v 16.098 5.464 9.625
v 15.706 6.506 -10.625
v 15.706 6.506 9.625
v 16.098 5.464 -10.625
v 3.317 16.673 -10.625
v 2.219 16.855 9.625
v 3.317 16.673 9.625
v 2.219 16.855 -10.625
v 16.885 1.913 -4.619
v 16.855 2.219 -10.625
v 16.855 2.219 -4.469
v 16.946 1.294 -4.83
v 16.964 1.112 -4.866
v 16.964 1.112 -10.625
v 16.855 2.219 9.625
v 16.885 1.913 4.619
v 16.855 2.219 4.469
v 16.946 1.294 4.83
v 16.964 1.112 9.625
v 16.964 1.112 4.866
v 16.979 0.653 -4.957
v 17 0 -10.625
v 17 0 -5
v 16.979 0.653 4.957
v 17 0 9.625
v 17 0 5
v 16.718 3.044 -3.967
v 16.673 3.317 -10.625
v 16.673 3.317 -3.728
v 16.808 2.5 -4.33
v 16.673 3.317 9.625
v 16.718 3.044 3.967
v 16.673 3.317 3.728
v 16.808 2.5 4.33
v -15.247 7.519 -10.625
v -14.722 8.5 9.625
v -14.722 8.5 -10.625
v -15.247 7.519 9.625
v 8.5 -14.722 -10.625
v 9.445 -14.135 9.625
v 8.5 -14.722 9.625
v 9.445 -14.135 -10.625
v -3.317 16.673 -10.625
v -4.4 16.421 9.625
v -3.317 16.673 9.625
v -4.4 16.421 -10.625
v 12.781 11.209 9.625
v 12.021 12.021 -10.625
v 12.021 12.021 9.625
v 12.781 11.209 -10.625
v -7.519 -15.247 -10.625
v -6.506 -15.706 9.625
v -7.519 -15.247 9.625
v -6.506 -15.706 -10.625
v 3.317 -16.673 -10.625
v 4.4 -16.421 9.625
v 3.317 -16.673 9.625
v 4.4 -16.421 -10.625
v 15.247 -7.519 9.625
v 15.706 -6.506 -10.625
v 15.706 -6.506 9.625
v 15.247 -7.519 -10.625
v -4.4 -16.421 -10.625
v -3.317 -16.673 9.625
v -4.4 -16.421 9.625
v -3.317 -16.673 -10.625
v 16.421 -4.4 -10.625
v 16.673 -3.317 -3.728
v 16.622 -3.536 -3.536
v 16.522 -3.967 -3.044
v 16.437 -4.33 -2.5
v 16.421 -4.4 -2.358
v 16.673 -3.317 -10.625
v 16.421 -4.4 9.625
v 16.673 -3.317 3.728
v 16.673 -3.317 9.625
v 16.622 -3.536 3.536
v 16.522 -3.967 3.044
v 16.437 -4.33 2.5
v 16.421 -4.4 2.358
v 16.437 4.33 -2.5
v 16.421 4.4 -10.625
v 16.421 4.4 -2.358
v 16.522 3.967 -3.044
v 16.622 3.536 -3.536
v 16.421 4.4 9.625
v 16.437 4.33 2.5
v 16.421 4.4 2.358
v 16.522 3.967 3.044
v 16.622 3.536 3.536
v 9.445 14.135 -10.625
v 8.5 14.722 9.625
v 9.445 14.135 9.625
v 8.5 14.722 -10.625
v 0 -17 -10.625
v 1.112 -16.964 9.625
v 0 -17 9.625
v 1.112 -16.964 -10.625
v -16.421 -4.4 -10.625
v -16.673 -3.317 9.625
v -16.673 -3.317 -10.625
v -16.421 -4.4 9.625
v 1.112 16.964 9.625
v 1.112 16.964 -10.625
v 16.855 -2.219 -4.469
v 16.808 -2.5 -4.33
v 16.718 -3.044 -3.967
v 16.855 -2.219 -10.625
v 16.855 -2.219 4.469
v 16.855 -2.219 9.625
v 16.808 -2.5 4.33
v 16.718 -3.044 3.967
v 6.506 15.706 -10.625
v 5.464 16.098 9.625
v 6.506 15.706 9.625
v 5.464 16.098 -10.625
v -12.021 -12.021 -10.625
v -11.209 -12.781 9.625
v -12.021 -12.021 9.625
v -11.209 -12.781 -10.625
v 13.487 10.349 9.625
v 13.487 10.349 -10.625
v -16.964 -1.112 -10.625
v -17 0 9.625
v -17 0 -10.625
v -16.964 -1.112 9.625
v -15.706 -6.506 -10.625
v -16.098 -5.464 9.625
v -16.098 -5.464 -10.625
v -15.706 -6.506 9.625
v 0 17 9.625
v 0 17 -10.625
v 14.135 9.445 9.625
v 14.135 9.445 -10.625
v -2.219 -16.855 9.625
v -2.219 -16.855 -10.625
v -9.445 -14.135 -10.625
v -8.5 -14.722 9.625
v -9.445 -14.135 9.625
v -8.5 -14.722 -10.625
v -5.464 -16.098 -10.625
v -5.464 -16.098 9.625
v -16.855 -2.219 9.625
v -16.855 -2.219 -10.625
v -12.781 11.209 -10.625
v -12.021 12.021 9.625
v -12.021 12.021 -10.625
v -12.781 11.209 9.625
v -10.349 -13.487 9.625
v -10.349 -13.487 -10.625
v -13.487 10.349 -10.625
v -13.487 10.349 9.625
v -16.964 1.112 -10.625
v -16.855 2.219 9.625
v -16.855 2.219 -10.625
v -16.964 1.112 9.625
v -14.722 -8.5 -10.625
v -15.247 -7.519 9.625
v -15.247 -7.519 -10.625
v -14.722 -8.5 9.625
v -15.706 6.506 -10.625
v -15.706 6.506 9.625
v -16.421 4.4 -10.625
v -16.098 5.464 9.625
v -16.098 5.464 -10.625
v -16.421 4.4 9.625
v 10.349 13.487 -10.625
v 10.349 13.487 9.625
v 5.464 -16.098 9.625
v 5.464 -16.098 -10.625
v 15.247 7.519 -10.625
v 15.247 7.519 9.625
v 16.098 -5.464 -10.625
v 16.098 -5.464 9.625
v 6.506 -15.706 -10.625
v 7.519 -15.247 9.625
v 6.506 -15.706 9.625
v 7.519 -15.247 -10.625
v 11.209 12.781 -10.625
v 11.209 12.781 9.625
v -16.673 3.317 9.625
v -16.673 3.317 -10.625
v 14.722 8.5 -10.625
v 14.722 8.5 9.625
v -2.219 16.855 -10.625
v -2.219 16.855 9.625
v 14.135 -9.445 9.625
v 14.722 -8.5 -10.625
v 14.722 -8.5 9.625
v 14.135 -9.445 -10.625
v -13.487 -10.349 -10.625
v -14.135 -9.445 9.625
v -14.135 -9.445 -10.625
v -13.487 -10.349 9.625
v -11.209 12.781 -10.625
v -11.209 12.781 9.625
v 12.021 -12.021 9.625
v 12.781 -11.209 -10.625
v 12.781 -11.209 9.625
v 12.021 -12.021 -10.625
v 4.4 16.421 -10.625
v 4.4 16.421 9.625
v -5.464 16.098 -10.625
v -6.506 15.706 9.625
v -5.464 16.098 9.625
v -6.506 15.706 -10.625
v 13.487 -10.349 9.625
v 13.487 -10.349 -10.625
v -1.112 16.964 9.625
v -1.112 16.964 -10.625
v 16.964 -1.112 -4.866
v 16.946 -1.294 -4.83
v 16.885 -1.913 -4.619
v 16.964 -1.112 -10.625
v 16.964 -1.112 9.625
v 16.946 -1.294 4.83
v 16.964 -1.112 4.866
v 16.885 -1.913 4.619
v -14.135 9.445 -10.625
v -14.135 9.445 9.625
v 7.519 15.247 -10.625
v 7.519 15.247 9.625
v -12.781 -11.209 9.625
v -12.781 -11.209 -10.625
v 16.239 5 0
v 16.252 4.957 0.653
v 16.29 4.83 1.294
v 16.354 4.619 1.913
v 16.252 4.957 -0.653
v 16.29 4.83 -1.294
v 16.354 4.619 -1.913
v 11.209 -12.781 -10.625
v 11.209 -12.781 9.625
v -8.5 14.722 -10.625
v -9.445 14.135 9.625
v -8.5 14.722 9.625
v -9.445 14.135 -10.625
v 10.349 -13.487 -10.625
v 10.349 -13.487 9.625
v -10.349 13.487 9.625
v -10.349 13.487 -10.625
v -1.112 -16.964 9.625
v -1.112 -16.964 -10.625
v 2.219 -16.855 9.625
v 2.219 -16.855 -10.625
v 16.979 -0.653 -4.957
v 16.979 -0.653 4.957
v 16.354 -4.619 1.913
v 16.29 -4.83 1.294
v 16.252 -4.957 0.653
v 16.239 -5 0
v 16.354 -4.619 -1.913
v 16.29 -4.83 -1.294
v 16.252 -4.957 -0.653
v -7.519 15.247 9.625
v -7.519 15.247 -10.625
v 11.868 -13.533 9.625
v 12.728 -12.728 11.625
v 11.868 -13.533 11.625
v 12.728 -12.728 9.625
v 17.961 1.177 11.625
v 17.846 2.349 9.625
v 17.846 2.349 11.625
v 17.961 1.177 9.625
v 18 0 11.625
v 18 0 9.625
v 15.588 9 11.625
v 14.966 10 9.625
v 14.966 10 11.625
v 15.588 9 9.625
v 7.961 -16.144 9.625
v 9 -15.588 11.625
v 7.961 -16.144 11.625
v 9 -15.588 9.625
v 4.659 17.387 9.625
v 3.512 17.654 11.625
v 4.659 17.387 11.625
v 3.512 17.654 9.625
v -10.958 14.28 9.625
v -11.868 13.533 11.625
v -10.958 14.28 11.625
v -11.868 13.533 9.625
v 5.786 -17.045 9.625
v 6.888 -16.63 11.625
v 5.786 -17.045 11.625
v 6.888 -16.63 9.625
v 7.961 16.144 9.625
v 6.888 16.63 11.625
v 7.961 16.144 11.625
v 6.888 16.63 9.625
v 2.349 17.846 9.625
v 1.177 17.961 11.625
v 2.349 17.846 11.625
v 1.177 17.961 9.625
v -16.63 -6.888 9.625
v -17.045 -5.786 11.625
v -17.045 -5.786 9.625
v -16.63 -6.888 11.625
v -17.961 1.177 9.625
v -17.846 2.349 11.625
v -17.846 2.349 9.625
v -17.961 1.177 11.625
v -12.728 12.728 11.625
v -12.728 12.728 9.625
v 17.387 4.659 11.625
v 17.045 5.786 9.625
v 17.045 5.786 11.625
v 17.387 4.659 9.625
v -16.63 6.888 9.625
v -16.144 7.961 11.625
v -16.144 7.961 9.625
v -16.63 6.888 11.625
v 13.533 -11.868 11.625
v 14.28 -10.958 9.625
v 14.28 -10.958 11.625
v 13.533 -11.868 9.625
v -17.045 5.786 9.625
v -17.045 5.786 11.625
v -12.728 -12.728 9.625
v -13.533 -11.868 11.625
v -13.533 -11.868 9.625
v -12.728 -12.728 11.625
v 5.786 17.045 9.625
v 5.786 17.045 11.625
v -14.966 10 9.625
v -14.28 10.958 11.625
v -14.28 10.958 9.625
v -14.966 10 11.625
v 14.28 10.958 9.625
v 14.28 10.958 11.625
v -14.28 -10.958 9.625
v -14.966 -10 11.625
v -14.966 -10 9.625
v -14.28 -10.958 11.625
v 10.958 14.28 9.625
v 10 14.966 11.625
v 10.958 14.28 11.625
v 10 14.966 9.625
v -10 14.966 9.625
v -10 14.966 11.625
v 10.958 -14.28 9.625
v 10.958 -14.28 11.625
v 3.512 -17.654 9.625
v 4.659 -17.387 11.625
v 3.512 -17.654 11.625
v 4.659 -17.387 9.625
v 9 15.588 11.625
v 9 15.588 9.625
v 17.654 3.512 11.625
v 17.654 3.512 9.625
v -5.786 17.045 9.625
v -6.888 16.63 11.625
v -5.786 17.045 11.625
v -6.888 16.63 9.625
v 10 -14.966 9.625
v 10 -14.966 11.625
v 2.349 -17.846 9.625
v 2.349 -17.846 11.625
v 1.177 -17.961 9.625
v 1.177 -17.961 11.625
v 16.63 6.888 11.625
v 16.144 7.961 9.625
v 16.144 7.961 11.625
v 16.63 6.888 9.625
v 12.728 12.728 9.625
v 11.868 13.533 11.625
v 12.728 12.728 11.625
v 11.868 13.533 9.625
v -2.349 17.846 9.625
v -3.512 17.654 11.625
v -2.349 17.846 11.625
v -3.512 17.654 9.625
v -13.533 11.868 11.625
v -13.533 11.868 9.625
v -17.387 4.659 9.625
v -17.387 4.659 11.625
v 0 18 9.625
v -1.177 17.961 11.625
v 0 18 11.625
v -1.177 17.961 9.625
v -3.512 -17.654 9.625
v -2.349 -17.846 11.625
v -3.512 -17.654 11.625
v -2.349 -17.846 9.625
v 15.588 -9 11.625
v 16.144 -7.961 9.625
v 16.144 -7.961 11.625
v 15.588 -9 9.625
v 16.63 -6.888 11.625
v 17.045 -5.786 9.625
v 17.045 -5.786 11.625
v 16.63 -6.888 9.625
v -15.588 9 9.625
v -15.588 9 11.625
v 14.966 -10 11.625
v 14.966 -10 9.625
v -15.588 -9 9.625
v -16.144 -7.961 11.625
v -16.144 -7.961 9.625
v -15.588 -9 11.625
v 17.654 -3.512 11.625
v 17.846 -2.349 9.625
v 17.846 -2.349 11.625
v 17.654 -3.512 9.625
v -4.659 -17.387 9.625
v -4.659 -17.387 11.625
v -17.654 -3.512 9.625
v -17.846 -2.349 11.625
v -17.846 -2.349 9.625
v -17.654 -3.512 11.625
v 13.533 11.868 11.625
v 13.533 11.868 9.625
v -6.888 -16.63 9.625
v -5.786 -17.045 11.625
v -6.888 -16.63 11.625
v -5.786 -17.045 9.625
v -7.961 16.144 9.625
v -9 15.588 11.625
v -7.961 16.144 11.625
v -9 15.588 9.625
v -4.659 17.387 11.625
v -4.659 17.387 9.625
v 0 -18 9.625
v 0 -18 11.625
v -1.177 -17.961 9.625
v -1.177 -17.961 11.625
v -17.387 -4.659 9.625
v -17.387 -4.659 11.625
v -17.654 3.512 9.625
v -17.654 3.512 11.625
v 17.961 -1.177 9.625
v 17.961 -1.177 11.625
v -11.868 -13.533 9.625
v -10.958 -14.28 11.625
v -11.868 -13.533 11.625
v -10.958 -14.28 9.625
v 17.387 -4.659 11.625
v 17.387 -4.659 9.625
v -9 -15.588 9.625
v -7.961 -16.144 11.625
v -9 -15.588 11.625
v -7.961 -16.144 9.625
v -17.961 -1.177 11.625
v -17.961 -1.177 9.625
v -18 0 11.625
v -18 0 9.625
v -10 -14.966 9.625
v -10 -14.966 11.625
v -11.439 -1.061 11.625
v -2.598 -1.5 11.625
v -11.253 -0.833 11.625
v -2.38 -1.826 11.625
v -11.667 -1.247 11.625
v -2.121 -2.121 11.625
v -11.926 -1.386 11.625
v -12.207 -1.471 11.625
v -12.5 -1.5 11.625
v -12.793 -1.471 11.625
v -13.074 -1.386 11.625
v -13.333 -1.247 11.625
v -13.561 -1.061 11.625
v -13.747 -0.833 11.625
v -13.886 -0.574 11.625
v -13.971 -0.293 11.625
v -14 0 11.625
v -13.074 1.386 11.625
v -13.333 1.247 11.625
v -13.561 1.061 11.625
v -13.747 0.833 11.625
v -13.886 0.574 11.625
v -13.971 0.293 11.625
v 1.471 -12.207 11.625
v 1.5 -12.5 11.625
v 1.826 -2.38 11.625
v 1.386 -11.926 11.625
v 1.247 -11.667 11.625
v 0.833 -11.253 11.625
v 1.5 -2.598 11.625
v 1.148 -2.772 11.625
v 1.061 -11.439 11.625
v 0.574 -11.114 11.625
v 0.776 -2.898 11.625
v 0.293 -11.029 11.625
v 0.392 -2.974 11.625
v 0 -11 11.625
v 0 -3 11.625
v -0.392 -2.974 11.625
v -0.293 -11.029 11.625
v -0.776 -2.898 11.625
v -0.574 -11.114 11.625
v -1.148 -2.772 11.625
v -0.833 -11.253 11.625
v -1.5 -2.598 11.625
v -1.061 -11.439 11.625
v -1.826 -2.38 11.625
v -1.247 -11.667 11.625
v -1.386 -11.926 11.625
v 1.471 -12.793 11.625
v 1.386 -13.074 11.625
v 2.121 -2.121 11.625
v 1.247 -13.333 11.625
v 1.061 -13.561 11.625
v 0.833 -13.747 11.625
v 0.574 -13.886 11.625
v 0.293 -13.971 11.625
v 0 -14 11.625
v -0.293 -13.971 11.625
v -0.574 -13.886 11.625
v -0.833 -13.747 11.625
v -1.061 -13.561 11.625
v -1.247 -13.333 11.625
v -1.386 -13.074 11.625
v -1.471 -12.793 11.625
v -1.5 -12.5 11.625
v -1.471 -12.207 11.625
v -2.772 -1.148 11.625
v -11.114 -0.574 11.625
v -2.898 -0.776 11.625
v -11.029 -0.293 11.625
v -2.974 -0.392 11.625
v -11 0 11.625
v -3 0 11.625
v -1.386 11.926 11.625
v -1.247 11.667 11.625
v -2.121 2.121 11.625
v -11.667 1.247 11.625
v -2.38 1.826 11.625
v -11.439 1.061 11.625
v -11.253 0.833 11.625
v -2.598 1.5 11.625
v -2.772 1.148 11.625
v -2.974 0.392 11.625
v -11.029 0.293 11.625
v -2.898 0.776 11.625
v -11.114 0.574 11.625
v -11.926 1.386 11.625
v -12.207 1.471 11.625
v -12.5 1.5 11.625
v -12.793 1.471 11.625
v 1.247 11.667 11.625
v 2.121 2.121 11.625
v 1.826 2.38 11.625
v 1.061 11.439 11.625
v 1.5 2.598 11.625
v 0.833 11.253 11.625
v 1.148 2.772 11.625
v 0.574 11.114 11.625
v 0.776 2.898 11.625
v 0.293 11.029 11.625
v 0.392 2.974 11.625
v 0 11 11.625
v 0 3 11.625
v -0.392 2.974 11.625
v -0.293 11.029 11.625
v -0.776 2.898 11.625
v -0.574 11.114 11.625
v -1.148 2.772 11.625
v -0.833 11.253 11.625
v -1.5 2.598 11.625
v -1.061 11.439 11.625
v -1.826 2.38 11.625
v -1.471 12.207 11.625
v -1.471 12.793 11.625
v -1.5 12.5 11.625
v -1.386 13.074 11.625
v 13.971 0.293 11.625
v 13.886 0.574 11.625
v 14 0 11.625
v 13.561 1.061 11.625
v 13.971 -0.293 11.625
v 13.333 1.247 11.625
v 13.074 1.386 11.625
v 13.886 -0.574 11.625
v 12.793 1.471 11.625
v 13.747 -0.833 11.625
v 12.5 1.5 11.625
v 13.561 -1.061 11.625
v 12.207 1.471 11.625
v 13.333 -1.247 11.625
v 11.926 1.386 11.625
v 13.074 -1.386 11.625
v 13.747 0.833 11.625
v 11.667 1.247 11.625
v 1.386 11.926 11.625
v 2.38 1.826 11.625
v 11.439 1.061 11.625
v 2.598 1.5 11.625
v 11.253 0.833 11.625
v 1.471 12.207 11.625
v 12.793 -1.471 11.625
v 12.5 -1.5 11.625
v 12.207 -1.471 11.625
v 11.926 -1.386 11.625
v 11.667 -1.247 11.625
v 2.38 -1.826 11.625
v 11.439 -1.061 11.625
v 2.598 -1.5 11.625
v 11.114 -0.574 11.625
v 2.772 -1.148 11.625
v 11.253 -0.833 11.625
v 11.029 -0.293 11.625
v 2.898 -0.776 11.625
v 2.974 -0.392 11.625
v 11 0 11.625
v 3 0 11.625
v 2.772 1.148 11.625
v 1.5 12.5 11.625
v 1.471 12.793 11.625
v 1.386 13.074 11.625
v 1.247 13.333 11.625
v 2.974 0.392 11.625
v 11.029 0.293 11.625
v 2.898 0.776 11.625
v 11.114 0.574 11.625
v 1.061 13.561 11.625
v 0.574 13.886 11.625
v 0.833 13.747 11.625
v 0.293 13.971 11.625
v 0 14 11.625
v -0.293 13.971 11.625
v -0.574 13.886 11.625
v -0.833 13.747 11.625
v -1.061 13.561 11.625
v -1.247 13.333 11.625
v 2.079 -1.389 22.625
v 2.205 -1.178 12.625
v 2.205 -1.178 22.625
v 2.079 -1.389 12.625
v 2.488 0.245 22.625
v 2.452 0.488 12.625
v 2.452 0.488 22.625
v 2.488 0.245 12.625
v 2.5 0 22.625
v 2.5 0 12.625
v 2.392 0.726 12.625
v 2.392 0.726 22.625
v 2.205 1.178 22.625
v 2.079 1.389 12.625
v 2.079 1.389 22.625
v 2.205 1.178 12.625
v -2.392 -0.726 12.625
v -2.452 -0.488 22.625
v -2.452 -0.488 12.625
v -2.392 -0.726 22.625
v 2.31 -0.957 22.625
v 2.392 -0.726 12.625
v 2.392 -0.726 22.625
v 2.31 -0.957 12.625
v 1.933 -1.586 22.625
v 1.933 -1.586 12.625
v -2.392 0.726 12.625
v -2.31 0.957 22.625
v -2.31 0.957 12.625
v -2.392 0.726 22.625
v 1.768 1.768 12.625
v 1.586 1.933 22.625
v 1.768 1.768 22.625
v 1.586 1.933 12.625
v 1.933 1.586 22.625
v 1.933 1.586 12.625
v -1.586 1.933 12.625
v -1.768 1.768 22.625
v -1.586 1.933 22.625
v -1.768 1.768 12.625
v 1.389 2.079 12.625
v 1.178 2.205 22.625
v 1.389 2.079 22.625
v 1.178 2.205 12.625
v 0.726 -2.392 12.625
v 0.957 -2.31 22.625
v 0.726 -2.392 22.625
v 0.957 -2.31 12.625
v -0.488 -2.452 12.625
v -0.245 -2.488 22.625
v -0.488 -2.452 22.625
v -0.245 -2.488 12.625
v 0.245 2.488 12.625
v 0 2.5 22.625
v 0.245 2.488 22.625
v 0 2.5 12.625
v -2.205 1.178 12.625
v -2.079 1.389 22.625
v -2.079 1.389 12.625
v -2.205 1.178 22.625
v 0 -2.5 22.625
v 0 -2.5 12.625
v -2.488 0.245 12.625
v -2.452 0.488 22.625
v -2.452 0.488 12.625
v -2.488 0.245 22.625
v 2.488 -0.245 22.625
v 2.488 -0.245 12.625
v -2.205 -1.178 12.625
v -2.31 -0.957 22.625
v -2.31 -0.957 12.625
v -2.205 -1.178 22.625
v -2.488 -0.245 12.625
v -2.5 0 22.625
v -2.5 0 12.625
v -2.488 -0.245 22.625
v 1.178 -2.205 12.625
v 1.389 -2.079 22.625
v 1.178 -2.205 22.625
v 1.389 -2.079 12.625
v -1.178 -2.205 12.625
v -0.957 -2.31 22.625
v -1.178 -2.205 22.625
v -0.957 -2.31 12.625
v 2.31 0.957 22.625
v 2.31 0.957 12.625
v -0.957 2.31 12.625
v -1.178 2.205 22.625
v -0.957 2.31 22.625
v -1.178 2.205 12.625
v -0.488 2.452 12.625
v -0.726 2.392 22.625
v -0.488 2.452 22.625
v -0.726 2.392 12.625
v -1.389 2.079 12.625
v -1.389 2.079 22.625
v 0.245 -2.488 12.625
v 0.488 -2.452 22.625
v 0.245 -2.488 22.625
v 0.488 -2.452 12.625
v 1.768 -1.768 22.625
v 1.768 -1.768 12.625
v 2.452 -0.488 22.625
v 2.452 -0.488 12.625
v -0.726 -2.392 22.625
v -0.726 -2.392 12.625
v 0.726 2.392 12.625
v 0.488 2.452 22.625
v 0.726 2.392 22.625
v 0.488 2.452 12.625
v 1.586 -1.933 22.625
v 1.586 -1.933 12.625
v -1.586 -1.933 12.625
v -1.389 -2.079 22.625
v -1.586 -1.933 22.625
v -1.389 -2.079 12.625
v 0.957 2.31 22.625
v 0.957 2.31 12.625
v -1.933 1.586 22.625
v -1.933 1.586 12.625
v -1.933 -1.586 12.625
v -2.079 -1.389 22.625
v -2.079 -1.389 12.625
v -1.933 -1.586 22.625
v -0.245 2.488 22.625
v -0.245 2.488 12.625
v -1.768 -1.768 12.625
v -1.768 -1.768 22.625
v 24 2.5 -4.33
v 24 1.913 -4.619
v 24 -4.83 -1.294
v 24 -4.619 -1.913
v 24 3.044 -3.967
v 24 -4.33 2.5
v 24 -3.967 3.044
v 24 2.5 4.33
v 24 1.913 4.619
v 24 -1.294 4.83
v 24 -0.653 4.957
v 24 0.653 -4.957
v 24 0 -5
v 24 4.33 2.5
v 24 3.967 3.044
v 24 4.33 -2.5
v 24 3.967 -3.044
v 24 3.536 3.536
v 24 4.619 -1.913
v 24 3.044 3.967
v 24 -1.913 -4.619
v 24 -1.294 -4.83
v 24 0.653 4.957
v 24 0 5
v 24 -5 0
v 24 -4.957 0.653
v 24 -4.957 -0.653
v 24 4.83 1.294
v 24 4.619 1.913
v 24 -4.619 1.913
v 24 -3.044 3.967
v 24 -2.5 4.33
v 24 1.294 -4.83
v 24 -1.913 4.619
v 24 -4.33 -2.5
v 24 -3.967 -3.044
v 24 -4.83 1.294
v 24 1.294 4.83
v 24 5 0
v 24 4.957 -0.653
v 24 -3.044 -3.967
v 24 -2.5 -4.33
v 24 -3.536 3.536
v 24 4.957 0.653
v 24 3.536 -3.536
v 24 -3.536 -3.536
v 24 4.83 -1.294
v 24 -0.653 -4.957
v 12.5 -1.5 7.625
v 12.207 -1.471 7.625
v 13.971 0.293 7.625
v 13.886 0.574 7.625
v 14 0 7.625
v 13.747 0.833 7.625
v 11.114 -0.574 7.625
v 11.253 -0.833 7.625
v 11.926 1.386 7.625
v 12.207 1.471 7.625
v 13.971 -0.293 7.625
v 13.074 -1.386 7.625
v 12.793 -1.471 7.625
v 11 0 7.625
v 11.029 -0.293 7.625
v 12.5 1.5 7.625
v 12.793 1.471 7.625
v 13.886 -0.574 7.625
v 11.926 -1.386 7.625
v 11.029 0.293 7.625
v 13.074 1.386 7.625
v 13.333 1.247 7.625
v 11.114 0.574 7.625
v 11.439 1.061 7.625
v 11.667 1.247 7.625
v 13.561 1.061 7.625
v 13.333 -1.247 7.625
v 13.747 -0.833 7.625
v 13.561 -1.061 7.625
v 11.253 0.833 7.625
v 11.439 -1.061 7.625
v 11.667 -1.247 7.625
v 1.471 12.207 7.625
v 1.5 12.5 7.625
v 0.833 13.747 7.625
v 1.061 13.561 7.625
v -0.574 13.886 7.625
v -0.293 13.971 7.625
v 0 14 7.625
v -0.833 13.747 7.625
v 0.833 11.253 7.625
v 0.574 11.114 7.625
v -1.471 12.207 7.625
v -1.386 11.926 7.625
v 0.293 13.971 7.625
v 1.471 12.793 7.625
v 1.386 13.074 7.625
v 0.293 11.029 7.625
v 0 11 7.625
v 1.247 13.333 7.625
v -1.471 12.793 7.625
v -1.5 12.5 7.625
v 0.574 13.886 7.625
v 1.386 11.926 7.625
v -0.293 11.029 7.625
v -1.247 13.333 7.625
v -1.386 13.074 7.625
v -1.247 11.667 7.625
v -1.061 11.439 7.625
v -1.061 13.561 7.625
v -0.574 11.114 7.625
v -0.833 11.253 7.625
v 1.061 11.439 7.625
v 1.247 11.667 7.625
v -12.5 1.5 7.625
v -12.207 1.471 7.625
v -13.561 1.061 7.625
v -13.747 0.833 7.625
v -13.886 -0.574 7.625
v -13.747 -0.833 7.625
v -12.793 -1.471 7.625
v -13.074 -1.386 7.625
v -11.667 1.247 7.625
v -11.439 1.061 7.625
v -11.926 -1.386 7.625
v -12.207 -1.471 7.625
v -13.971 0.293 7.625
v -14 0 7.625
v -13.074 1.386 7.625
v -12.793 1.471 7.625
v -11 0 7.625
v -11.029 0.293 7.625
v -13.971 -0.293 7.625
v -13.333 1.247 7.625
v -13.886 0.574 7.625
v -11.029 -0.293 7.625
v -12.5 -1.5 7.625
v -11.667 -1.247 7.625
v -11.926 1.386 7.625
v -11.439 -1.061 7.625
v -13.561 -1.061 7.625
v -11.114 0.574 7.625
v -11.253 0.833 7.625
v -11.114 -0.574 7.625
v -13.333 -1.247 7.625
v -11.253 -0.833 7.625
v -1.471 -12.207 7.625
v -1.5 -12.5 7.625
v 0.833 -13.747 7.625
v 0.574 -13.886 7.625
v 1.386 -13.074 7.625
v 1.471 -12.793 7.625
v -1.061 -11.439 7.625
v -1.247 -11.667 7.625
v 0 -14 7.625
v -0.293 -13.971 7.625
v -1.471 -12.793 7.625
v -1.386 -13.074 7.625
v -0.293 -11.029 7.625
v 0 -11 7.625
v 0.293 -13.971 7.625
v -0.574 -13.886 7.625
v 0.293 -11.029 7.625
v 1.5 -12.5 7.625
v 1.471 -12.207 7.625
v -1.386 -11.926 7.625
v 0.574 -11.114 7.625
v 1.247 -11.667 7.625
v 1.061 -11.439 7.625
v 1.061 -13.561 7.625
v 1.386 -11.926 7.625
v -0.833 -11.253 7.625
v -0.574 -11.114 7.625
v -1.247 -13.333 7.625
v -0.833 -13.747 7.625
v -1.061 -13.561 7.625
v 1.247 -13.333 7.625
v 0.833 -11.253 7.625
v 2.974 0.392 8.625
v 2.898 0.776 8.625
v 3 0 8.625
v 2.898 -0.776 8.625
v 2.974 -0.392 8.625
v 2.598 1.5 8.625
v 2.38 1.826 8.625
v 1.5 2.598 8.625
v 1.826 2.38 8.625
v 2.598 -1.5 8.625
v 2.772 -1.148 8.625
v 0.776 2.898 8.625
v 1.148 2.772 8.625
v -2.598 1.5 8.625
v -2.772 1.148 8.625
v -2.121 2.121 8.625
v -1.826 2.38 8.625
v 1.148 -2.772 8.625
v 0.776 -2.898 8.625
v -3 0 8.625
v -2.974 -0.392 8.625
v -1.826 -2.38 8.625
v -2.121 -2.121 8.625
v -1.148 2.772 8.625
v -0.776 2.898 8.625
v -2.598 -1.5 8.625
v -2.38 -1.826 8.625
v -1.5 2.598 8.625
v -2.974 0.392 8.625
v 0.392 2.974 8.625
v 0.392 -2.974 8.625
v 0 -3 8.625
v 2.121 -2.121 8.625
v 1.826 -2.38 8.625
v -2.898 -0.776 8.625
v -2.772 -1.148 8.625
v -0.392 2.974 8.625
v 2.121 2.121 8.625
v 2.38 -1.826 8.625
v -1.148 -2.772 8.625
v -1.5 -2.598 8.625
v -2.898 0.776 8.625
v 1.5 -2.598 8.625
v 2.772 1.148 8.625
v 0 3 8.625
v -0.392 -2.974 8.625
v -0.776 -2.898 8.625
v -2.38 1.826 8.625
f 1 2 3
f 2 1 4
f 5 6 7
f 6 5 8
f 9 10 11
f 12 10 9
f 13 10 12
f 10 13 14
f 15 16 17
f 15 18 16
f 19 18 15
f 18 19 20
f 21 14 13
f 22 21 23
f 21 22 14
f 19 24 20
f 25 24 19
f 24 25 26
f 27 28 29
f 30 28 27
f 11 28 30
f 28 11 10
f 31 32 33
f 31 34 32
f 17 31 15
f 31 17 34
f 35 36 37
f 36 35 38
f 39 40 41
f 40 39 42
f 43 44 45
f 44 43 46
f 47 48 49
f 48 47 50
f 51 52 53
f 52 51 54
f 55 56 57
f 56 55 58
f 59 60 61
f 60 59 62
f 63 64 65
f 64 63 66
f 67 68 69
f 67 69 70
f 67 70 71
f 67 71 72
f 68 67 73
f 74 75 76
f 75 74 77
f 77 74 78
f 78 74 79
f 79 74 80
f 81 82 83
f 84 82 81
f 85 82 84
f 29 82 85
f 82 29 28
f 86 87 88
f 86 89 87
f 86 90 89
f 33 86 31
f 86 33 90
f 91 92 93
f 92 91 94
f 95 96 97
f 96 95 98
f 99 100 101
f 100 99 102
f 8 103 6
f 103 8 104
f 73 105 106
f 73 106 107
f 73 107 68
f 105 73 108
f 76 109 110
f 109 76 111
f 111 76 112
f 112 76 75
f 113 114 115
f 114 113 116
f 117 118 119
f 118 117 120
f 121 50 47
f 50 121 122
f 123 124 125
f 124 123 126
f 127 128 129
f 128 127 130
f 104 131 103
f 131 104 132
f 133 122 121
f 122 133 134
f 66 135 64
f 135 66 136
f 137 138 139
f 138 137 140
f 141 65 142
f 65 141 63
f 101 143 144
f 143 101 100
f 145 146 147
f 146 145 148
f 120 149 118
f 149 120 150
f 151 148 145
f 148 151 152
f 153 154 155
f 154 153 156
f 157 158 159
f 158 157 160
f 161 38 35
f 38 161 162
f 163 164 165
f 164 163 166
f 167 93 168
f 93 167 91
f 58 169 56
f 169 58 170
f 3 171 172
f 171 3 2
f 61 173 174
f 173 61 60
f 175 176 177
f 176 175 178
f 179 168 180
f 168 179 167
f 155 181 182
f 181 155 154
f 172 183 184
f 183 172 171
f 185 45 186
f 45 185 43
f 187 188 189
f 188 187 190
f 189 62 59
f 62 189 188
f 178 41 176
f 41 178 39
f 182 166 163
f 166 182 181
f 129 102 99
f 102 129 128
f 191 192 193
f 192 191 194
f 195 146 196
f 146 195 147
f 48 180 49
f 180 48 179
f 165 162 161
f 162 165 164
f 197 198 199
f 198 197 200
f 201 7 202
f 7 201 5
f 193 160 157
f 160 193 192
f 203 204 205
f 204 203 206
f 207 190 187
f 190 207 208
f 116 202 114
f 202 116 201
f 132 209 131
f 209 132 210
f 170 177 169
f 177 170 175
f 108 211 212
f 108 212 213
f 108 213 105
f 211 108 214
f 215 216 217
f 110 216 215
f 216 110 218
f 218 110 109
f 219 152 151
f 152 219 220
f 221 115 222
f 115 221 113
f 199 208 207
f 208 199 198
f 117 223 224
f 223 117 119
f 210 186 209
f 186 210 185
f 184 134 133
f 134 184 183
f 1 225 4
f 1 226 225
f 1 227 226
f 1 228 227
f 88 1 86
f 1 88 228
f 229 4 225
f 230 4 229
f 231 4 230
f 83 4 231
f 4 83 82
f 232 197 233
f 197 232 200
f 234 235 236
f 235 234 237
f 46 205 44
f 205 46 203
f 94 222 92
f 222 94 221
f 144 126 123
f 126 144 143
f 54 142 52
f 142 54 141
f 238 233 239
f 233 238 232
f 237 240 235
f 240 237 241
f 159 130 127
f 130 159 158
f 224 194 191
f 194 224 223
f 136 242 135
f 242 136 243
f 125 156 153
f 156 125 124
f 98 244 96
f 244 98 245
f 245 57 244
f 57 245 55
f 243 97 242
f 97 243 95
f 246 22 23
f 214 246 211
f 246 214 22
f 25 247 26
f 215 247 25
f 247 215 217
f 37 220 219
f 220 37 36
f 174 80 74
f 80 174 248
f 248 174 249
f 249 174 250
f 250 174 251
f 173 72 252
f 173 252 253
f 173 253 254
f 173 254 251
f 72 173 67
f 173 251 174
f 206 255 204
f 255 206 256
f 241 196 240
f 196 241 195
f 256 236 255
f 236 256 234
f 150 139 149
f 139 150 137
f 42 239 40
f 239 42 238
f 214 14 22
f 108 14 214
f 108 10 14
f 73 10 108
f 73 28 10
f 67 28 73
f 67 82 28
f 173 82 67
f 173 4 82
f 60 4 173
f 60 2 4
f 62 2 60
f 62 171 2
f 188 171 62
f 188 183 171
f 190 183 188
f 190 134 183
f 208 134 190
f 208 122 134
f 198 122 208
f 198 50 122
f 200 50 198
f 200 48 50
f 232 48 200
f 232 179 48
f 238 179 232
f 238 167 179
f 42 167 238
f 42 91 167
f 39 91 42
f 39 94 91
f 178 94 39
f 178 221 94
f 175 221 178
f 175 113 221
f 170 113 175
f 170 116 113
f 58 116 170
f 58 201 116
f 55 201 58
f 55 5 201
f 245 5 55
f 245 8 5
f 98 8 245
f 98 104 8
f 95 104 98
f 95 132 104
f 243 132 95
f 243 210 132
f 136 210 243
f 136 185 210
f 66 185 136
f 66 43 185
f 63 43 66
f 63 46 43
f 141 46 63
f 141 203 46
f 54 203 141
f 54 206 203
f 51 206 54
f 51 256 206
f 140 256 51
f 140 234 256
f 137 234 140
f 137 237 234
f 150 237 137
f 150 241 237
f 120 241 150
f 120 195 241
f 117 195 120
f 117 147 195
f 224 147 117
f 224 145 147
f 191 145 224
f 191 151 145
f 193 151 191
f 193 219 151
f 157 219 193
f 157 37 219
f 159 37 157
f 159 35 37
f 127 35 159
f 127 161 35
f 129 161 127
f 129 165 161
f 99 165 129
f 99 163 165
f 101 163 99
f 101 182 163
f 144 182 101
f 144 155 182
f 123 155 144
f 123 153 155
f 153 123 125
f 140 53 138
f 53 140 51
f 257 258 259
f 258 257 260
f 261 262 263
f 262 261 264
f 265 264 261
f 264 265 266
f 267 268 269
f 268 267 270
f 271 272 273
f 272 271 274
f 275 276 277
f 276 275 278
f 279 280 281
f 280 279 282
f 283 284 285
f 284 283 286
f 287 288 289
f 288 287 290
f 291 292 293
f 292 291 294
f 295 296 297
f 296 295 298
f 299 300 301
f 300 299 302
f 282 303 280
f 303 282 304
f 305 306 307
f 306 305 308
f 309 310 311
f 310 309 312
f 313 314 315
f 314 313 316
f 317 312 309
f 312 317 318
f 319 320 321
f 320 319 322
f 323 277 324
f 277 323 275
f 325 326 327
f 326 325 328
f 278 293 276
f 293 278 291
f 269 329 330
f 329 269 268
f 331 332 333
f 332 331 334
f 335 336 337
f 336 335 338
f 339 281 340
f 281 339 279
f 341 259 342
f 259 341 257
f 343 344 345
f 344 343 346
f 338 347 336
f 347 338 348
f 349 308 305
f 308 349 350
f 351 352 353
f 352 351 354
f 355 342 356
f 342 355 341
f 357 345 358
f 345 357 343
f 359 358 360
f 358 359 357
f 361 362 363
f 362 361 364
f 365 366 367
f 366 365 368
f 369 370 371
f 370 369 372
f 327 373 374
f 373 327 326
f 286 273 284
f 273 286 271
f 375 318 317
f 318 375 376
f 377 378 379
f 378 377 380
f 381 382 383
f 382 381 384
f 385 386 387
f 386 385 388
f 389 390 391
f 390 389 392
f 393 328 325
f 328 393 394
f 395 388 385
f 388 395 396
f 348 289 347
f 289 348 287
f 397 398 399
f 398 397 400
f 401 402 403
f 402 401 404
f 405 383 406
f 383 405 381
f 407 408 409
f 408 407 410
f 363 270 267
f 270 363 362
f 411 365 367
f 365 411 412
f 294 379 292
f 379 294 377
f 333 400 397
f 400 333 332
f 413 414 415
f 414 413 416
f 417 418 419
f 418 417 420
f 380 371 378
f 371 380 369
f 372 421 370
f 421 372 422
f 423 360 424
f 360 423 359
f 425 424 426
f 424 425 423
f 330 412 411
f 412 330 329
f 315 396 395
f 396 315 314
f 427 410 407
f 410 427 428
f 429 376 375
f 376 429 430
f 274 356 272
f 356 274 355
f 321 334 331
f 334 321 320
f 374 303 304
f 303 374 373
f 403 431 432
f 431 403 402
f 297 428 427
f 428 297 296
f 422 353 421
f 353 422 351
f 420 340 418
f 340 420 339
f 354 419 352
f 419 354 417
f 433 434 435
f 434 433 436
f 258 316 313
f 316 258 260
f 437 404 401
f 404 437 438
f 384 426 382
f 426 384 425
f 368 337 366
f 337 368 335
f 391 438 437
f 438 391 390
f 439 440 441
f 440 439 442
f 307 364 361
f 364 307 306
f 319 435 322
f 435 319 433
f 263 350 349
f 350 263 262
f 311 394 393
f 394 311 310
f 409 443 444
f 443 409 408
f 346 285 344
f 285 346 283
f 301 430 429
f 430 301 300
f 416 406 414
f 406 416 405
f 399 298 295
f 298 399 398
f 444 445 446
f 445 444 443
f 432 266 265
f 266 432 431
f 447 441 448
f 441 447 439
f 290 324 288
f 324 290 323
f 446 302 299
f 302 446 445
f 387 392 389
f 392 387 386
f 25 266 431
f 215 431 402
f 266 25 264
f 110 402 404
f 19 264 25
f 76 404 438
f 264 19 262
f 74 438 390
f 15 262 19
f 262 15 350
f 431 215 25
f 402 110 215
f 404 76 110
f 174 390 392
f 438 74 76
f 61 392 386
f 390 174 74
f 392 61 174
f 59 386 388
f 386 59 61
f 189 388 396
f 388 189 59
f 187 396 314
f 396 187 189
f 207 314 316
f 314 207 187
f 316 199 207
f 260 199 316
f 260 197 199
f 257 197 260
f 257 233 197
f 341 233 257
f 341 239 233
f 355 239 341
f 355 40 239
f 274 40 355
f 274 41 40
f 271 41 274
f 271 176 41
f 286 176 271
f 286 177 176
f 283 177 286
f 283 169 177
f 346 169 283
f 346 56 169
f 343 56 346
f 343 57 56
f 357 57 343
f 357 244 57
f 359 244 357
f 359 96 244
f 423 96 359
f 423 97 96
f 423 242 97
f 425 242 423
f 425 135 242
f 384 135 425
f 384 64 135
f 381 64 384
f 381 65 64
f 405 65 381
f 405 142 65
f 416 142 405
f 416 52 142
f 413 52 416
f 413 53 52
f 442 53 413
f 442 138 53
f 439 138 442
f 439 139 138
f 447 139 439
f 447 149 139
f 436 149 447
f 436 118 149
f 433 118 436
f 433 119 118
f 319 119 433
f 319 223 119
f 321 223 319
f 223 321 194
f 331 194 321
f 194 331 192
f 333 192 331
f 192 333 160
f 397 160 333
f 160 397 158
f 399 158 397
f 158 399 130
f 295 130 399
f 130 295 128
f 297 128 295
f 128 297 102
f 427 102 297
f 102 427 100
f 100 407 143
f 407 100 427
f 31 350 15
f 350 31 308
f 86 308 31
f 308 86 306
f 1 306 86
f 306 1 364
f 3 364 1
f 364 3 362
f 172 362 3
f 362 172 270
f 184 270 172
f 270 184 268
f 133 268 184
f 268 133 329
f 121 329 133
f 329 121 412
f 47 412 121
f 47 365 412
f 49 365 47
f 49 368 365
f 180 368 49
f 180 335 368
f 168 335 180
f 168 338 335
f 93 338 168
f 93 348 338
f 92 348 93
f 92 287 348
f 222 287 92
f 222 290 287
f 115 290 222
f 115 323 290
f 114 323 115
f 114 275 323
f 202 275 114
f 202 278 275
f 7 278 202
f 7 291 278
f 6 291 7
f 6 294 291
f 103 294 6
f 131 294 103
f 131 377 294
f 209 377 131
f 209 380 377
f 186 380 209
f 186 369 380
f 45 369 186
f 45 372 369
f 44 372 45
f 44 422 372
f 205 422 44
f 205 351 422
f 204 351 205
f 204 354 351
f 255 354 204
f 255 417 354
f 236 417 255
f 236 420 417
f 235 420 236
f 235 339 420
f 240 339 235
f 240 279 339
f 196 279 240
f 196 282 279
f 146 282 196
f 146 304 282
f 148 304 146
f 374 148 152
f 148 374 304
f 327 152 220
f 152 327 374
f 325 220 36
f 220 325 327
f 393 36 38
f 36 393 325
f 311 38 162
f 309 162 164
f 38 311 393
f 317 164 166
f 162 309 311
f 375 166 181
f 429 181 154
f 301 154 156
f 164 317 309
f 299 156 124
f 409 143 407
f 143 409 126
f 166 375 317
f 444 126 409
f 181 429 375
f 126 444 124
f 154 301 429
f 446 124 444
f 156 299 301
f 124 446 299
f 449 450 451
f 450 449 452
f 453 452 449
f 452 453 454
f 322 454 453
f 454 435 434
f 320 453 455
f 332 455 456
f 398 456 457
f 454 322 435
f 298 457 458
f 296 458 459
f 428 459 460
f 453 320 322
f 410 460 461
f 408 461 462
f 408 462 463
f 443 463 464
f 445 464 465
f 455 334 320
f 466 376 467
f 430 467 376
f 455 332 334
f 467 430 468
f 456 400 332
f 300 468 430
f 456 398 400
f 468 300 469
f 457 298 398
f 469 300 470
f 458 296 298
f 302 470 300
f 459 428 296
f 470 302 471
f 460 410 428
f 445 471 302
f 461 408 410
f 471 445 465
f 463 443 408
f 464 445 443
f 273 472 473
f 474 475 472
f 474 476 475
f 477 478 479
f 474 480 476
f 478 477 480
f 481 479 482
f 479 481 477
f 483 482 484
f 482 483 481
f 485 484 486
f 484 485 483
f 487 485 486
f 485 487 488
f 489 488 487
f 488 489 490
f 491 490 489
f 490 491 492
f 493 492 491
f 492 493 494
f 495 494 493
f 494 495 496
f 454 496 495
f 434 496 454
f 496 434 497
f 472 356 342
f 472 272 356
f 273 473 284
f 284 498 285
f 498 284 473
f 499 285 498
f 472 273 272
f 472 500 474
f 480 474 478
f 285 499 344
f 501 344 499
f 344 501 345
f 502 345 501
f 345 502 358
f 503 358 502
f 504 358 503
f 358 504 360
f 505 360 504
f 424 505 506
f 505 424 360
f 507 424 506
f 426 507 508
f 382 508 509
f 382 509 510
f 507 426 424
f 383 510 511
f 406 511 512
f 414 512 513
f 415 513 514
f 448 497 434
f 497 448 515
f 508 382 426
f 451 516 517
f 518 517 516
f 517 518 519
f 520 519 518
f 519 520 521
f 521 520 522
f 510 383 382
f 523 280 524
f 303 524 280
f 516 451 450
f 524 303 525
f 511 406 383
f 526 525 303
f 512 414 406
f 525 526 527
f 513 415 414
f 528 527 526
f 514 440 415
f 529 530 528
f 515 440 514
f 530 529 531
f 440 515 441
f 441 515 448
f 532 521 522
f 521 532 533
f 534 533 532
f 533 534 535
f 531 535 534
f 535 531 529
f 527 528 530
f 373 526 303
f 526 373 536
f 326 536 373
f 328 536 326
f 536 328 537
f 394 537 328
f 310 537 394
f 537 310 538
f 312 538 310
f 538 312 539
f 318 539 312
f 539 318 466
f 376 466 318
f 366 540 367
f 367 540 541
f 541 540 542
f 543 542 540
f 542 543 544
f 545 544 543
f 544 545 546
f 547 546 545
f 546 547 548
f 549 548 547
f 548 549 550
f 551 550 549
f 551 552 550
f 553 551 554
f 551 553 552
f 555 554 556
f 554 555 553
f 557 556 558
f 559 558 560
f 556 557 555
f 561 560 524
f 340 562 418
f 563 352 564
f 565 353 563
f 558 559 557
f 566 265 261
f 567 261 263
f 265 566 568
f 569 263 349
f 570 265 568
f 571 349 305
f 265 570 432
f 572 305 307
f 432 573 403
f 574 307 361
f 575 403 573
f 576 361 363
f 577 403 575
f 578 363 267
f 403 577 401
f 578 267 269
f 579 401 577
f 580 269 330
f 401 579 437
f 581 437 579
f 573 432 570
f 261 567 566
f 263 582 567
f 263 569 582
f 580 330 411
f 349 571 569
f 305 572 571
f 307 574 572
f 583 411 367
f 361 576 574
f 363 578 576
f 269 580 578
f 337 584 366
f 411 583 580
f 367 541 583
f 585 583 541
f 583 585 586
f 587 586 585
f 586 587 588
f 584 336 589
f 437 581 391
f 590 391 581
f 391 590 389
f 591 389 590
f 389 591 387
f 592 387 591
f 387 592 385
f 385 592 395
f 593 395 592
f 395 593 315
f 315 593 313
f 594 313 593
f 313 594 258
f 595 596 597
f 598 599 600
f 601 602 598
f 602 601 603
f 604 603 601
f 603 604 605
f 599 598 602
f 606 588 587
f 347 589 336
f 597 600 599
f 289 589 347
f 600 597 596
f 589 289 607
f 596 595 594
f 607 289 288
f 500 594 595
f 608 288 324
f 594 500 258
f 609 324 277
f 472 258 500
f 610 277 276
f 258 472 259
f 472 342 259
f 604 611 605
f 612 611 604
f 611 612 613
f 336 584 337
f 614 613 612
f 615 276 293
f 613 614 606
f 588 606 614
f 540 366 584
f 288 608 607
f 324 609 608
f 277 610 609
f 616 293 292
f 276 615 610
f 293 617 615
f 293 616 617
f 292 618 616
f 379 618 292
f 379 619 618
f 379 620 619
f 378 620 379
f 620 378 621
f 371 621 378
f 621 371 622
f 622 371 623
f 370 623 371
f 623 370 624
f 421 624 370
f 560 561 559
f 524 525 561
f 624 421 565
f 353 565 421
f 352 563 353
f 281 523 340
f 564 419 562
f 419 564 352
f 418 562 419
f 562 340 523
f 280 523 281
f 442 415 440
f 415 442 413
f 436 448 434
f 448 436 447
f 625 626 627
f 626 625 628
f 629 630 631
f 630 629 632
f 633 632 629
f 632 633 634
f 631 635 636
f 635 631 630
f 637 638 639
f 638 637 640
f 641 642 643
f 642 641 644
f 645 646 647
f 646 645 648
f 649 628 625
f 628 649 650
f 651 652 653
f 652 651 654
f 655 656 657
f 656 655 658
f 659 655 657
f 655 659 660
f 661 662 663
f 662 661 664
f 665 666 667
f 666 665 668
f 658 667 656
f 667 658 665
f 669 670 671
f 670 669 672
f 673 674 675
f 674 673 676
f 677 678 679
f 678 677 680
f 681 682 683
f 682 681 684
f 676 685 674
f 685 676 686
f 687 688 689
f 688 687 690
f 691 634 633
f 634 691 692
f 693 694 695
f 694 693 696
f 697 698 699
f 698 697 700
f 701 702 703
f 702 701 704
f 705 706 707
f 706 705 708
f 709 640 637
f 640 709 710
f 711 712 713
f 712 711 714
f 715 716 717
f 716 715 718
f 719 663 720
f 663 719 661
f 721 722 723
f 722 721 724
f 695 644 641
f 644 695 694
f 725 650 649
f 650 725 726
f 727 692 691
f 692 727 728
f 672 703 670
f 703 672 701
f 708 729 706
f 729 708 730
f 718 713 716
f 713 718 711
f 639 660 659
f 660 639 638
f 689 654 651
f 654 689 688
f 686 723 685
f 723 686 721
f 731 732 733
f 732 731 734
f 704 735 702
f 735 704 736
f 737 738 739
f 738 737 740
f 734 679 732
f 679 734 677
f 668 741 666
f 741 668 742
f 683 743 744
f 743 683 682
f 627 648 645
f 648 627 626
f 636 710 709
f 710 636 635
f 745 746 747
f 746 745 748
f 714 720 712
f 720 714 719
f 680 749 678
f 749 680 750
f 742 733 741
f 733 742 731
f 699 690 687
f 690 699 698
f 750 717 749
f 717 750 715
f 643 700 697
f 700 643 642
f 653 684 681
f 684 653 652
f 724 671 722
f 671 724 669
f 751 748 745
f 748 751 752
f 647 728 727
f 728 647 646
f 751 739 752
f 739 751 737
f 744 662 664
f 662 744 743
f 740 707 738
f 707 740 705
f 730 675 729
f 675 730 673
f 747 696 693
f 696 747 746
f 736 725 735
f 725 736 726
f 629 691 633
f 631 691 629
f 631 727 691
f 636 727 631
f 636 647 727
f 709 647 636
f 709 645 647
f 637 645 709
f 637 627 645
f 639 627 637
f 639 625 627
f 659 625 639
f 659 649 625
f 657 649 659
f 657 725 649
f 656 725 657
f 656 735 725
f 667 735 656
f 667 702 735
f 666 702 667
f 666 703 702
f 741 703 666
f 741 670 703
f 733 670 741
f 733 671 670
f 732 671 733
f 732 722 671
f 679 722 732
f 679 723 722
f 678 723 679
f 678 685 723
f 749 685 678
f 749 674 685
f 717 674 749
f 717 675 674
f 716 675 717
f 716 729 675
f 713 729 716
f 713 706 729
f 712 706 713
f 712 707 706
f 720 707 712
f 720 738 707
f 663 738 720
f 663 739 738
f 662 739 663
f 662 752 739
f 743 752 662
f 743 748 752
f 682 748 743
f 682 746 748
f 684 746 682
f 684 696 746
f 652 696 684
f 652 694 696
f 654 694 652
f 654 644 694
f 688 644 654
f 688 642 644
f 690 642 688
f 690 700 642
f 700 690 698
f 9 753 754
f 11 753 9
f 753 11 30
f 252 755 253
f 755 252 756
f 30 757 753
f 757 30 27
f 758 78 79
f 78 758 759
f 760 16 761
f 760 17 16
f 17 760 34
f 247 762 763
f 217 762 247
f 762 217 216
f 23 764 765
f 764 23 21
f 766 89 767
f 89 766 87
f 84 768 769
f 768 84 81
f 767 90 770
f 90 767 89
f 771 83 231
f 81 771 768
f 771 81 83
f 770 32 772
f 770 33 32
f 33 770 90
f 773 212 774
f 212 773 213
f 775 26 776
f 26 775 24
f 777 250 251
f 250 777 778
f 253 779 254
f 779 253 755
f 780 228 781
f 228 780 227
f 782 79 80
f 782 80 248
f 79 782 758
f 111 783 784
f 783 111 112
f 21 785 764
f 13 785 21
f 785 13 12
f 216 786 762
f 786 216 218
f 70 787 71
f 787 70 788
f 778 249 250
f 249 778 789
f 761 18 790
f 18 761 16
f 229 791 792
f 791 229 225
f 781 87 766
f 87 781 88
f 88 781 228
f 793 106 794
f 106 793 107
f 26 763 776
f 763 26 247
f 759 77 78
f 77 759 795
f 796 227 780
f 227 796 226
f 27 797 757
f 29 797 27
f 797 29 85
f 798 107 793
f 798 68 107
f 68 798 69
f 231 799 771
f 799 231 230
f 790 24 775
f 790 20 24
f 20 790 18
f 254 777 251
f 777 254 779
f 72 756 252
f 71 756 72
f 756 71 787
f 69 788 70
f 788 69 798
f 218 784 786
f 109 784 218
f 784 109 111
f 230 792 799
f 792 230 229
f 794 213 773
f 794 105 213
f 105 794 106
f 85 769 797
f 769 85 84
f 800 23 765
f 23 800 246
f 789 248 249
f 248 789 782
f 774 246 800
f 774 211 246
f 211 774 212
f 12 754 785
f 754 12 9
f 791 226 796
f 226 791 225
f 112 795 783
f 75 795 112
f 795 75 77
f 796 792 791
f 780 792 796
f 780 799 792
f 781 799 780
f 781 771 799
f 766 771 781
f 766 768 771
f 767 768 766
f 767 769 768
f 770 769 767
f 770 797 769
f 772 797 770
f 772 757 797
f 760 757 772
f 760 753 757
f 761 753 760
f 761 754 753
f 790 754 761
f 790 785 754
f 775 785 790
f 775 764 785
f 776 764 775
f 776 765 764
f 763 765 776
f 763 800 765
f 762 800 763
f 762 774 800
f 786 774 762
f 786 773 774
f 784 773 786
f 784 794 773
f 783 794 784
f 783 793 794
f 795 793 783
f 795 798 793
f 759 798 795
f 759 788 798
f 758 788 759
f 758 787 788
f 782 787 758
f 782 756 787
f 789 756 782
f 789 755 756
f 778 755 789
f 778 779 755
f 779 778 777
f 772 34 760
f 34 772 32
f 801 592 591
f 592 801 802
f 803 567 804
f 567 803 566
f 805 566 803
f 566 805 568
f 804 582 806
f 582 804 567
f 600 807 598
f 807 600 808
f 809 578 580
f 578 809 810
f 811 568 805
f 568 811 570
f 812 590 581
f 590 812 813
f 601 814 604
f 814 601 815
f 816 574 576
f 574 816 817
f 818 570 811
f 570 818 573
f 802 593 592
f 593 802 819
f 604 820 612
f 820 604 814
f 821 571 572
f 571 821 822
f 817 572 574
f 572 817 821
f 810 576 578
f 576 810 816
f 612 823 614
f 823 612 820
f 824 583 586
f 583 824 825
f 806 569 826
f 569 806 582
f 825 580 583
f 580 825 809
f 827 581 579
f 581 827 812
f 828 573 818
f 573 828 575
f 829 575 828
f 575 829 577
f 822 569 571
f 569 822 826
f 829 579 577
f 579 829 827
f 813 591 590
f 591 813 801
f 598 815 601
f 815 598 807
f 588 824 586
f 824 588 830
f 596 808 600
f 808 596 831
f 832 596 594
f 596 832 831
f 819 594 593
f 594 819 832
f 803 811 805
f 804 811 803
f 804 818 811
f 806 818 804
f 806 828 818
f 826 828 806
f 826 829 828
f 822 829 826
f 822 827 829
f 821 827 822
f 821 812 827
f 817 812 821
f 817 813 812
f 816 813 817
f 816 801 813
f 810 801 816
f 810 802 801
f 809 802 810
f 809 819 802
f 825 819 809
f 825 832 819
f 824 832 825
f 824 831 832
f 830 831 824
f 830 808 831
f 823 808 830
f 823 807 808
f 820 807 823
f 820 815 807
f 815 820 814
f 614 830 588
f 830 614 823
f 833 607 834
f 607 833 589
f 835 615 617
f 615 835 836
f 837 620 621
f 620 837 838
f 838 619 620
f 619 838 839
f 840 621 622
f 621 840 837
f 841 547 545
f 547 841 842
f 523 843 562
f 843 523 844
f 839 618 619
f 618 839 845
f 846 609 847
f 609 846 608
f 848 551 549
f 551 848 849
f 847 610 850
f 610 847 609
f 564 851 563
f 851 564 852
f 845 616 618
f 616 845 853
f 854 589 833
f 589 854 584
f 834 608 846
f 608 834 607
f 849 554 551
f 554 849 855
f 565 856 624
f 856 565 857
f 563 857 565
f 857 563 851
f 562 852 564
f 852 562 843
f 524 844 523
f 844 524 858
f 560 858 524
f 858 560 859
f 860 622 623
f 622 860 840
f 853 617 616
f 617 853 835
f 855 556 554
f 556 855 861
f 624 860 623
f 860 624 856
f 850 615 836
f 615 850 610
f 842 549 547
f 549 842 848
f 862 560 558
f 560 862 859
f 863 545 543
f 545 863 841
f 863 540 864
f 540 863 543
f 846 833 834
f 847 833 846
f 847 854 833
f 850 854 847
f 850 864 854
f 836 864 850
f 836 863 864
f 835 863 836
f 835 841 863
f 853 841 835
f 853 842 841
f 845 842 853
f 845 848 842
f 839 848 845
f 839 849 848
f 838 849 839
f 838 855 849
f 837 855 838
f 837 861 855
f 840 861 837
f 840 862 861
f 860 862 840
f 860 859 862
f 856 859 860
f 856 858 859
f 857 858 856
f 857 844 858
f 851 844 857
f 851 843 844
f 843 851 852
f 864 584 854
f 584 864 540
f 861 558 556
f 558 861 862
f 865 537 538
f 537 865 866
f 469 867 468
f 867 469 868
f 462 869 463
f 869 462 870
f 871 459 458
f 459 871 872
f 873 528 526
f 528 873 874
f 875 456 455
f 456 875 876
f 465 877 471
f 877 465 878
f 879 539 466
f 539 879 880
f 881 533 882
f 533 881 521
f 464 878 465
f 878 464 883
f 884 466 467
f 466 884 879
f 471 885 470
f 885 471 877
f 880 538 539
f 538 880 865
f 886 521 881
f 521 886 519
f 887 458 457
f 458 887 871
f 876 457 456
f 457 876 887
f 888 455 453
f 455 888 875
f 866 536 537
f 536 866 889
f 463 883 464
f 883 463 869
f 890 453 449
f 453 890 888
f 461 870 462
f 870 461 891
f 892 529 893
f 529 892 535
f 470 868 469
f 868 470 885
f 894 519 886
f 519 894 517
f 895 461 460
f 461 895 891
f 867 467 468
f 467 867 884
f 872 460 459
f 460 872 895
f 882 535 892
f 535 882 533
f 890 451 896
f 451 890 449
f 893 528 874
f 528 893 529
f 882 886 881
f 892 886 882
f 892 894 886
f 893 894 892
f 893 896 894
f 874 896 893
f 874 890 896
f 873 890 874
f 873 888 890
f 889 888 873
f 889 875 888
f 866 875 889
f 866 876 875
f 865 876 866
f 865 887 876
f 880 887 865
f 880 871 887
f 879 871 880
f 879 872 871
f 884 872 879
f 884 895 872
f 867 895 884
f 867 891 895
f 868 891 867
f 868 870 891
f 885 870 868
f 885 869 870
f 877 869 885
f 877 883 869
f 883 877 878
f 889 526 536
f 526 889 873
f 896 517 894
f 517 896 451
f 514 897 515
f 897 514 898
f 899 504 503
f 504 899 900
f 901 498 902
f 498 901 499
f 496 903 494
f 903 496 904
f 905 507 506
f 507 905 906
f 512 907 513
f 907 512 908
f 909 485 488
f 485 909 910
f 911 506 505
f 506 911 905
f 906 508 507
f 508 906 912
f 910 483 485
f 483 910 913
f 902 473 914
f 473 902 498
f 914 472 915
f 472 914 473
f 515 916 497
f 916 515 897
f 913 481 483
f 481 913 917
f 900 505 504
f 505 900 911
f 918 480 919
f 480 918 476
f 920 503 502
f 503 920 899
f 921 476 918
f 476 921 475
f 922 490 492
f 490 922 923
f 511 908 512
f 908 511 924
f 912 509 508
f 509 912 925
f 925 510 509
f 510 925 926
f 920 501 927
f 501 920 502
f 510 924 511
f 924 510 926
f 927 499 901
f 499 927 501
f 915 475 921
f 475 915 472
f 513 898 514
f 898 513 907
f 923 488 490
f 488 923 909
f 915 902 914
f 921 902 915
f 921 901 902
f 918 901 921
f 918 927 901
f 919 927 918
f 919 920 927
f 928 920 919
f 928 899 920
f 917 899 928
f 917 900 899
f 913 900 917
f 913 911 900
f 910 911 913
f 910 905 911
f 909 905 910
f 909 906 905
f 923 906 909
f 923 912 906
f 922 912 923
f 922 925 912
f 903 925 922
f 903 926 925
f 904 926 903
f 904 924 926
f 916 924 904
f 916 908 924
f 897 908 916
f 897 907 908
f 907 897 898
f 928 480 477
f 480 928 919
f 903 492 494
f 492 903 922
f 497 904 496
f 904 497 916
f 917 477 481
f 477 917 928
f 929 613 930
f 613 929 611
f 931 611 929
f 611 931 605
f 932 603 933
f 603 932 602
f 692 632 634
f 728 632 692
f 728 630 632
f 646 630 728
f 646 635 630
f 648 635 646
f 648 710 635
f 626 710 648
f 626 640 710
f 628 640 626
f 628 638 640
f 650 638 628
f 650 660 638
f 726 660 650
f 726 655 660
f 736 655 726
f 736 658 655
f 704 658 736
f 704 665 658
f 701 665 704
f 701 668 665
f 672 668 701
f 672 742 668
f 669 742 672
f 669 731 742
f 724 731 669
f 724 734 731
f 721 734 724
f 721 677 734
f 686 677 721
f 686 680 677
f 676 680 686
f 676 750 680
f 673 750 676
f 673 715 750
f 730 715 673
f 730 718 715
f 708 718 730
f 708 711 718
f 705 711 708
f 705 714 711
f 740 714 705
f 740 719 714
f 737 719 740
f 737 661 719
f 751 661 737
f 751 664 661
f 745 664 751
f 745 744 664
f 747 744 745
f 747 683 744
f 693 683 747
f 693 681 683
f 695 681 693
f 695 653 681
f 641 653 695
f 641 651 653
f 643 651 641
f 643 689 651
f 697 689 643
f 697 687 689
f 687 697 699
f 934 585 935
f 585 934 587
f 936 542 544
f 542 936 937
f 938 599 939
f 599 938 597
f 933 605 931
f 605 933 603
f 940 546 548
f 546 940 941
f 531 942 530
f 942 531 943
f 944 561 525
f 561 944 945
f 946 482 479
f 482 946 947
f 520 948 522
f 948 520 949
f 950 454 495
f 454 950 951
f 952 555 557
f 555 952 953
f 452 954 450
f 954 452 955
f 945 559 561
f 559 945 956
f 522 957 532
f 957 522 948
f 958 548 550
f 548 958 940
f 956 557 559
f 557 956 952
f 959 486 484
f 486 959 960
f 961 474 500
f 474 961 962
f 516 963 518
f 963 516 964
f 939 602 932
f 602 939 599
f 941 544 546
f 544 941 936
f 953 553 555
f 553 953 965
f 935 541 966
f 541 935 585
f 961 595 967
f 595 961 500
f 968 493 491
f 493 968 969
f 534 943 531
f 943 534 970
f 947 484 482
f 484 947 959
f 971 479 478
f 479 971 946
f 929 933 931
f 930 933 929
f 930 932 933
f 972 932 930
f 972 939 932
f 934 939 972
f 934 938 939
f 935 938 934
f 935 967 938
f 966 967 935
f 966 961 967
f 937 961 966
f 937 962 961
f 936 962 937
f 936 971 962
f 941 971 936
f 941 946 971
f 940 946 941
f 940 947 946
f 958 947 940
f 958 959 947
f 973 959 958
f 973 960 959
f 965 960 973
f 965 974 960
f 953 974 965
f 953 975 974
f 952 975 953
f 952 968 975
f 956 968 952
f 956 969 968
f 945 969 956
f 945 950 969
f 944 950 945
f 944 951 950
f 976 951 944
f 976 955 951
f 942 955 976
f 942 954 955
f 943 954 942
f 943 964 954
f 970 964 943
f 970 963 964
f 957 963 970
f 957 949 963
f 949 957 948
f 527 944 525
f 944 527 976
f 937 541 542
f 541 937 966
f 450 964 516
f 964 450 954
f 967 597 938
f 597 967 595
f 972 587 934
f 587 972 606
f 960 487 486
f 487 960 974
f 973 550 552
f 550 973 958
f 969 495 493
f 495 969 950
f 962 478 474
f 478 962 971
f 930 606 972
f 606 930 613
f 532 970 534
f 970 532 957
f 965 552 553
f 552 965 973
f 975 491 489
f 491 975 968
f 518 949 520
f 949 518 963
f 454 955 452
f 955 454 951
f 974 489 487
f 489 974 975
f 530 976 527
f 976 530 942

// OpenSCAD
// Brushless DC motor (envelope-style) with stator Ø28.0mm and stator height 17.25mm
// One connected solid; no floating parts; no text/labels.

stator_diameter_mm = 28;          //[14:56:0.1]
stator_height_mm   = 17.25;       //[8.625:34.5:0.05]

shaft_diameter_mm          = 5;   //[2.5:10:0.1]
shaft_extension_front_mm   = 12;  //[6:24:0.5]
shaft_extension_rear_mm    = 0;   //[0:12:0.5]

airgap_radial_mm = 0.3;           //[0.1:1:0.05]

endbell_thickness_mm = 2;         //[1:4:0.1]

mount_hole_count = 4;             //[2:8:1]
mount_hole_diameter_mm = 3;       //[1.5:6:0.1]
mount_hole_circle_diameter_mm = 25; //[12.5:50:0.1]

mounting_face_thickness_mm = 2;   //[1:5:0.1]
mounting_face_outer_diameter_mm = 36; //[18:72:0.1]

bearing_seat_diameter_mm = 10;    //[6:20:0.1]
bearing_seat_length_mm   = 4;     //[2:10:0.1]

overlap_mm = 1;                   //[0.5:2:0.1]

// Optional side connector (kept but made motor-like and connected)
connector_diameter_mm = 10;       //[6:20:0.1]
connector_length_mm   = 8;        //[4:20:0.5]
connector_z_mm        = 0;        // centered on stator stack

$fn = 96;

// -------------------- Derived dimensions --------------------
stator_r = stator_diameter_mm/2;

// Typical 28mm-class outrunner can: can OD ~ stator OD + ~6mm
housing_outer_diameter_mm = stator_diameter_mm + 6; // ~3mm radial margin
housing_r = housing_outer_diameter_mm/2;

// Requested axial stack: stator height + endbells
motor_body_length_mm = stator_height_mm + 2*endbell_thickness_mm;

// Rotor bell (outer can) slightly larger than stator OD, inside housing
rotor_outer_diameter_mm = stator_diameter_mm + 2*airgap_radial_mm + 2.0;
rotor_r = rotor_outer_diameter_mm/2;
rotor_r_eff = min(rotor_r, housing_r - 0.6);

// Front mounting face at front
front_face_r = max(mounting_face_outer_diameter_mm/2, housing_r);

// Z references (centered motor body)
z_body_center = 0;
z_body_front  = z_body_center + motor_body_length_mm/2;
z_body_rear   = z_body_center - motor_body_length_mm/2;

z_front_endbell_center = z_body_front - endbell_thickness_mm/2;
z_rear_endbell_center  = z_body_rear + endbell_thickness_mm/2;

z_mount_face_center = z_body_front + mounting_face_thickness_mm/2 - overlap_mm;

// Shaft total length and center position
shaft_total_len = motor_body_length_mm + shaft_extension_front_mm + shaft_extension_rear_mm;
z_shaft_center  = (shaft_extension_front_mm - shaft_extension_rear_mm)/2;

// -------------------- Helpers --------------------
module radial_holes(count, pcd, hole_d, h, zc) {
  for (i = [0:count-1]) {
    rotate([0,0,i*360/count])
      translate([pcd/2, 0, zc])
        cylinder(d=hole_d, h=h, center=true, $fn=32);
  }
}

// -------------------- Motor model (single connected solid) --------------------
module bldc_motor() {
  difference() {
    union() {
      // Main can/housing (single cylinder defines the motor envelope)
      cylinder(r=housing_r, h=motor_body_length_mm, center=true);

      // Front mounting face/flange (connected with overlap)
      translate([0,0,z_mount_face_center])
        cylinder(r=front_face_r, h=mounting_face_thickness_mm, center=true);

      // Front bearing boss / seat envelope (connected)
      translate([0,0,z_front_endbell_center])
        cylinder(d=bearing_seat_diameter_mm, h=bearing_seat_length_mm, center=true);

      // Rotor bell hint (outer can region) - kept subtle and fully inside housing
      translate([0,0, 0])
        cylinder(r=rotor_r_eff, h=stator_height_mm/2 + overlap_mm, center=true);

      // Stator stack envelope (requested Ø and height) - overlaps to ensure connectivity
      cylinder(r=stator_r, h=stator_height_mm + overlap_mm, center=true);

      // Central shaft (through) - connected to bearing boss and body
      translate([0,0,z_shaft_center])
        cylinder(d=shaft_diameter_mm, h=shaft_total_len, center=true, $fn=64);

      // Side connector (motor wire exit), connected at housing edge with overlap
      translate([housing_r + connector_length_mm/2 - overlap_mm, 0, connector_z_mm])
        rotate([0,90,0])
          cylinder(d=connector_diameter_mm, h=connector_length_mm, center=true, $fn=48);
    }

    // Mounting holes (cut through mounting face + slightly into front end region)
    radial_holes(
      mount_hole_count,
      mount_hole_circle_diameter_mm,
      mount_hole_diameter_mm,
      mounting_face_thickness_mm + endbell_thickness_mm + 2*overlap_mm,
      z_mount_face_center
    );

    // Front shaft clearance recess (small)
    translate([0,0,z_mount_face_center])
      cylinder(d=shaft_diameter_mm + 1.0,
               h=mounting_face_thickness_mm + 2*overlap_mm,
               center=true, $fn=48);
  }
}

bldc_motor();
